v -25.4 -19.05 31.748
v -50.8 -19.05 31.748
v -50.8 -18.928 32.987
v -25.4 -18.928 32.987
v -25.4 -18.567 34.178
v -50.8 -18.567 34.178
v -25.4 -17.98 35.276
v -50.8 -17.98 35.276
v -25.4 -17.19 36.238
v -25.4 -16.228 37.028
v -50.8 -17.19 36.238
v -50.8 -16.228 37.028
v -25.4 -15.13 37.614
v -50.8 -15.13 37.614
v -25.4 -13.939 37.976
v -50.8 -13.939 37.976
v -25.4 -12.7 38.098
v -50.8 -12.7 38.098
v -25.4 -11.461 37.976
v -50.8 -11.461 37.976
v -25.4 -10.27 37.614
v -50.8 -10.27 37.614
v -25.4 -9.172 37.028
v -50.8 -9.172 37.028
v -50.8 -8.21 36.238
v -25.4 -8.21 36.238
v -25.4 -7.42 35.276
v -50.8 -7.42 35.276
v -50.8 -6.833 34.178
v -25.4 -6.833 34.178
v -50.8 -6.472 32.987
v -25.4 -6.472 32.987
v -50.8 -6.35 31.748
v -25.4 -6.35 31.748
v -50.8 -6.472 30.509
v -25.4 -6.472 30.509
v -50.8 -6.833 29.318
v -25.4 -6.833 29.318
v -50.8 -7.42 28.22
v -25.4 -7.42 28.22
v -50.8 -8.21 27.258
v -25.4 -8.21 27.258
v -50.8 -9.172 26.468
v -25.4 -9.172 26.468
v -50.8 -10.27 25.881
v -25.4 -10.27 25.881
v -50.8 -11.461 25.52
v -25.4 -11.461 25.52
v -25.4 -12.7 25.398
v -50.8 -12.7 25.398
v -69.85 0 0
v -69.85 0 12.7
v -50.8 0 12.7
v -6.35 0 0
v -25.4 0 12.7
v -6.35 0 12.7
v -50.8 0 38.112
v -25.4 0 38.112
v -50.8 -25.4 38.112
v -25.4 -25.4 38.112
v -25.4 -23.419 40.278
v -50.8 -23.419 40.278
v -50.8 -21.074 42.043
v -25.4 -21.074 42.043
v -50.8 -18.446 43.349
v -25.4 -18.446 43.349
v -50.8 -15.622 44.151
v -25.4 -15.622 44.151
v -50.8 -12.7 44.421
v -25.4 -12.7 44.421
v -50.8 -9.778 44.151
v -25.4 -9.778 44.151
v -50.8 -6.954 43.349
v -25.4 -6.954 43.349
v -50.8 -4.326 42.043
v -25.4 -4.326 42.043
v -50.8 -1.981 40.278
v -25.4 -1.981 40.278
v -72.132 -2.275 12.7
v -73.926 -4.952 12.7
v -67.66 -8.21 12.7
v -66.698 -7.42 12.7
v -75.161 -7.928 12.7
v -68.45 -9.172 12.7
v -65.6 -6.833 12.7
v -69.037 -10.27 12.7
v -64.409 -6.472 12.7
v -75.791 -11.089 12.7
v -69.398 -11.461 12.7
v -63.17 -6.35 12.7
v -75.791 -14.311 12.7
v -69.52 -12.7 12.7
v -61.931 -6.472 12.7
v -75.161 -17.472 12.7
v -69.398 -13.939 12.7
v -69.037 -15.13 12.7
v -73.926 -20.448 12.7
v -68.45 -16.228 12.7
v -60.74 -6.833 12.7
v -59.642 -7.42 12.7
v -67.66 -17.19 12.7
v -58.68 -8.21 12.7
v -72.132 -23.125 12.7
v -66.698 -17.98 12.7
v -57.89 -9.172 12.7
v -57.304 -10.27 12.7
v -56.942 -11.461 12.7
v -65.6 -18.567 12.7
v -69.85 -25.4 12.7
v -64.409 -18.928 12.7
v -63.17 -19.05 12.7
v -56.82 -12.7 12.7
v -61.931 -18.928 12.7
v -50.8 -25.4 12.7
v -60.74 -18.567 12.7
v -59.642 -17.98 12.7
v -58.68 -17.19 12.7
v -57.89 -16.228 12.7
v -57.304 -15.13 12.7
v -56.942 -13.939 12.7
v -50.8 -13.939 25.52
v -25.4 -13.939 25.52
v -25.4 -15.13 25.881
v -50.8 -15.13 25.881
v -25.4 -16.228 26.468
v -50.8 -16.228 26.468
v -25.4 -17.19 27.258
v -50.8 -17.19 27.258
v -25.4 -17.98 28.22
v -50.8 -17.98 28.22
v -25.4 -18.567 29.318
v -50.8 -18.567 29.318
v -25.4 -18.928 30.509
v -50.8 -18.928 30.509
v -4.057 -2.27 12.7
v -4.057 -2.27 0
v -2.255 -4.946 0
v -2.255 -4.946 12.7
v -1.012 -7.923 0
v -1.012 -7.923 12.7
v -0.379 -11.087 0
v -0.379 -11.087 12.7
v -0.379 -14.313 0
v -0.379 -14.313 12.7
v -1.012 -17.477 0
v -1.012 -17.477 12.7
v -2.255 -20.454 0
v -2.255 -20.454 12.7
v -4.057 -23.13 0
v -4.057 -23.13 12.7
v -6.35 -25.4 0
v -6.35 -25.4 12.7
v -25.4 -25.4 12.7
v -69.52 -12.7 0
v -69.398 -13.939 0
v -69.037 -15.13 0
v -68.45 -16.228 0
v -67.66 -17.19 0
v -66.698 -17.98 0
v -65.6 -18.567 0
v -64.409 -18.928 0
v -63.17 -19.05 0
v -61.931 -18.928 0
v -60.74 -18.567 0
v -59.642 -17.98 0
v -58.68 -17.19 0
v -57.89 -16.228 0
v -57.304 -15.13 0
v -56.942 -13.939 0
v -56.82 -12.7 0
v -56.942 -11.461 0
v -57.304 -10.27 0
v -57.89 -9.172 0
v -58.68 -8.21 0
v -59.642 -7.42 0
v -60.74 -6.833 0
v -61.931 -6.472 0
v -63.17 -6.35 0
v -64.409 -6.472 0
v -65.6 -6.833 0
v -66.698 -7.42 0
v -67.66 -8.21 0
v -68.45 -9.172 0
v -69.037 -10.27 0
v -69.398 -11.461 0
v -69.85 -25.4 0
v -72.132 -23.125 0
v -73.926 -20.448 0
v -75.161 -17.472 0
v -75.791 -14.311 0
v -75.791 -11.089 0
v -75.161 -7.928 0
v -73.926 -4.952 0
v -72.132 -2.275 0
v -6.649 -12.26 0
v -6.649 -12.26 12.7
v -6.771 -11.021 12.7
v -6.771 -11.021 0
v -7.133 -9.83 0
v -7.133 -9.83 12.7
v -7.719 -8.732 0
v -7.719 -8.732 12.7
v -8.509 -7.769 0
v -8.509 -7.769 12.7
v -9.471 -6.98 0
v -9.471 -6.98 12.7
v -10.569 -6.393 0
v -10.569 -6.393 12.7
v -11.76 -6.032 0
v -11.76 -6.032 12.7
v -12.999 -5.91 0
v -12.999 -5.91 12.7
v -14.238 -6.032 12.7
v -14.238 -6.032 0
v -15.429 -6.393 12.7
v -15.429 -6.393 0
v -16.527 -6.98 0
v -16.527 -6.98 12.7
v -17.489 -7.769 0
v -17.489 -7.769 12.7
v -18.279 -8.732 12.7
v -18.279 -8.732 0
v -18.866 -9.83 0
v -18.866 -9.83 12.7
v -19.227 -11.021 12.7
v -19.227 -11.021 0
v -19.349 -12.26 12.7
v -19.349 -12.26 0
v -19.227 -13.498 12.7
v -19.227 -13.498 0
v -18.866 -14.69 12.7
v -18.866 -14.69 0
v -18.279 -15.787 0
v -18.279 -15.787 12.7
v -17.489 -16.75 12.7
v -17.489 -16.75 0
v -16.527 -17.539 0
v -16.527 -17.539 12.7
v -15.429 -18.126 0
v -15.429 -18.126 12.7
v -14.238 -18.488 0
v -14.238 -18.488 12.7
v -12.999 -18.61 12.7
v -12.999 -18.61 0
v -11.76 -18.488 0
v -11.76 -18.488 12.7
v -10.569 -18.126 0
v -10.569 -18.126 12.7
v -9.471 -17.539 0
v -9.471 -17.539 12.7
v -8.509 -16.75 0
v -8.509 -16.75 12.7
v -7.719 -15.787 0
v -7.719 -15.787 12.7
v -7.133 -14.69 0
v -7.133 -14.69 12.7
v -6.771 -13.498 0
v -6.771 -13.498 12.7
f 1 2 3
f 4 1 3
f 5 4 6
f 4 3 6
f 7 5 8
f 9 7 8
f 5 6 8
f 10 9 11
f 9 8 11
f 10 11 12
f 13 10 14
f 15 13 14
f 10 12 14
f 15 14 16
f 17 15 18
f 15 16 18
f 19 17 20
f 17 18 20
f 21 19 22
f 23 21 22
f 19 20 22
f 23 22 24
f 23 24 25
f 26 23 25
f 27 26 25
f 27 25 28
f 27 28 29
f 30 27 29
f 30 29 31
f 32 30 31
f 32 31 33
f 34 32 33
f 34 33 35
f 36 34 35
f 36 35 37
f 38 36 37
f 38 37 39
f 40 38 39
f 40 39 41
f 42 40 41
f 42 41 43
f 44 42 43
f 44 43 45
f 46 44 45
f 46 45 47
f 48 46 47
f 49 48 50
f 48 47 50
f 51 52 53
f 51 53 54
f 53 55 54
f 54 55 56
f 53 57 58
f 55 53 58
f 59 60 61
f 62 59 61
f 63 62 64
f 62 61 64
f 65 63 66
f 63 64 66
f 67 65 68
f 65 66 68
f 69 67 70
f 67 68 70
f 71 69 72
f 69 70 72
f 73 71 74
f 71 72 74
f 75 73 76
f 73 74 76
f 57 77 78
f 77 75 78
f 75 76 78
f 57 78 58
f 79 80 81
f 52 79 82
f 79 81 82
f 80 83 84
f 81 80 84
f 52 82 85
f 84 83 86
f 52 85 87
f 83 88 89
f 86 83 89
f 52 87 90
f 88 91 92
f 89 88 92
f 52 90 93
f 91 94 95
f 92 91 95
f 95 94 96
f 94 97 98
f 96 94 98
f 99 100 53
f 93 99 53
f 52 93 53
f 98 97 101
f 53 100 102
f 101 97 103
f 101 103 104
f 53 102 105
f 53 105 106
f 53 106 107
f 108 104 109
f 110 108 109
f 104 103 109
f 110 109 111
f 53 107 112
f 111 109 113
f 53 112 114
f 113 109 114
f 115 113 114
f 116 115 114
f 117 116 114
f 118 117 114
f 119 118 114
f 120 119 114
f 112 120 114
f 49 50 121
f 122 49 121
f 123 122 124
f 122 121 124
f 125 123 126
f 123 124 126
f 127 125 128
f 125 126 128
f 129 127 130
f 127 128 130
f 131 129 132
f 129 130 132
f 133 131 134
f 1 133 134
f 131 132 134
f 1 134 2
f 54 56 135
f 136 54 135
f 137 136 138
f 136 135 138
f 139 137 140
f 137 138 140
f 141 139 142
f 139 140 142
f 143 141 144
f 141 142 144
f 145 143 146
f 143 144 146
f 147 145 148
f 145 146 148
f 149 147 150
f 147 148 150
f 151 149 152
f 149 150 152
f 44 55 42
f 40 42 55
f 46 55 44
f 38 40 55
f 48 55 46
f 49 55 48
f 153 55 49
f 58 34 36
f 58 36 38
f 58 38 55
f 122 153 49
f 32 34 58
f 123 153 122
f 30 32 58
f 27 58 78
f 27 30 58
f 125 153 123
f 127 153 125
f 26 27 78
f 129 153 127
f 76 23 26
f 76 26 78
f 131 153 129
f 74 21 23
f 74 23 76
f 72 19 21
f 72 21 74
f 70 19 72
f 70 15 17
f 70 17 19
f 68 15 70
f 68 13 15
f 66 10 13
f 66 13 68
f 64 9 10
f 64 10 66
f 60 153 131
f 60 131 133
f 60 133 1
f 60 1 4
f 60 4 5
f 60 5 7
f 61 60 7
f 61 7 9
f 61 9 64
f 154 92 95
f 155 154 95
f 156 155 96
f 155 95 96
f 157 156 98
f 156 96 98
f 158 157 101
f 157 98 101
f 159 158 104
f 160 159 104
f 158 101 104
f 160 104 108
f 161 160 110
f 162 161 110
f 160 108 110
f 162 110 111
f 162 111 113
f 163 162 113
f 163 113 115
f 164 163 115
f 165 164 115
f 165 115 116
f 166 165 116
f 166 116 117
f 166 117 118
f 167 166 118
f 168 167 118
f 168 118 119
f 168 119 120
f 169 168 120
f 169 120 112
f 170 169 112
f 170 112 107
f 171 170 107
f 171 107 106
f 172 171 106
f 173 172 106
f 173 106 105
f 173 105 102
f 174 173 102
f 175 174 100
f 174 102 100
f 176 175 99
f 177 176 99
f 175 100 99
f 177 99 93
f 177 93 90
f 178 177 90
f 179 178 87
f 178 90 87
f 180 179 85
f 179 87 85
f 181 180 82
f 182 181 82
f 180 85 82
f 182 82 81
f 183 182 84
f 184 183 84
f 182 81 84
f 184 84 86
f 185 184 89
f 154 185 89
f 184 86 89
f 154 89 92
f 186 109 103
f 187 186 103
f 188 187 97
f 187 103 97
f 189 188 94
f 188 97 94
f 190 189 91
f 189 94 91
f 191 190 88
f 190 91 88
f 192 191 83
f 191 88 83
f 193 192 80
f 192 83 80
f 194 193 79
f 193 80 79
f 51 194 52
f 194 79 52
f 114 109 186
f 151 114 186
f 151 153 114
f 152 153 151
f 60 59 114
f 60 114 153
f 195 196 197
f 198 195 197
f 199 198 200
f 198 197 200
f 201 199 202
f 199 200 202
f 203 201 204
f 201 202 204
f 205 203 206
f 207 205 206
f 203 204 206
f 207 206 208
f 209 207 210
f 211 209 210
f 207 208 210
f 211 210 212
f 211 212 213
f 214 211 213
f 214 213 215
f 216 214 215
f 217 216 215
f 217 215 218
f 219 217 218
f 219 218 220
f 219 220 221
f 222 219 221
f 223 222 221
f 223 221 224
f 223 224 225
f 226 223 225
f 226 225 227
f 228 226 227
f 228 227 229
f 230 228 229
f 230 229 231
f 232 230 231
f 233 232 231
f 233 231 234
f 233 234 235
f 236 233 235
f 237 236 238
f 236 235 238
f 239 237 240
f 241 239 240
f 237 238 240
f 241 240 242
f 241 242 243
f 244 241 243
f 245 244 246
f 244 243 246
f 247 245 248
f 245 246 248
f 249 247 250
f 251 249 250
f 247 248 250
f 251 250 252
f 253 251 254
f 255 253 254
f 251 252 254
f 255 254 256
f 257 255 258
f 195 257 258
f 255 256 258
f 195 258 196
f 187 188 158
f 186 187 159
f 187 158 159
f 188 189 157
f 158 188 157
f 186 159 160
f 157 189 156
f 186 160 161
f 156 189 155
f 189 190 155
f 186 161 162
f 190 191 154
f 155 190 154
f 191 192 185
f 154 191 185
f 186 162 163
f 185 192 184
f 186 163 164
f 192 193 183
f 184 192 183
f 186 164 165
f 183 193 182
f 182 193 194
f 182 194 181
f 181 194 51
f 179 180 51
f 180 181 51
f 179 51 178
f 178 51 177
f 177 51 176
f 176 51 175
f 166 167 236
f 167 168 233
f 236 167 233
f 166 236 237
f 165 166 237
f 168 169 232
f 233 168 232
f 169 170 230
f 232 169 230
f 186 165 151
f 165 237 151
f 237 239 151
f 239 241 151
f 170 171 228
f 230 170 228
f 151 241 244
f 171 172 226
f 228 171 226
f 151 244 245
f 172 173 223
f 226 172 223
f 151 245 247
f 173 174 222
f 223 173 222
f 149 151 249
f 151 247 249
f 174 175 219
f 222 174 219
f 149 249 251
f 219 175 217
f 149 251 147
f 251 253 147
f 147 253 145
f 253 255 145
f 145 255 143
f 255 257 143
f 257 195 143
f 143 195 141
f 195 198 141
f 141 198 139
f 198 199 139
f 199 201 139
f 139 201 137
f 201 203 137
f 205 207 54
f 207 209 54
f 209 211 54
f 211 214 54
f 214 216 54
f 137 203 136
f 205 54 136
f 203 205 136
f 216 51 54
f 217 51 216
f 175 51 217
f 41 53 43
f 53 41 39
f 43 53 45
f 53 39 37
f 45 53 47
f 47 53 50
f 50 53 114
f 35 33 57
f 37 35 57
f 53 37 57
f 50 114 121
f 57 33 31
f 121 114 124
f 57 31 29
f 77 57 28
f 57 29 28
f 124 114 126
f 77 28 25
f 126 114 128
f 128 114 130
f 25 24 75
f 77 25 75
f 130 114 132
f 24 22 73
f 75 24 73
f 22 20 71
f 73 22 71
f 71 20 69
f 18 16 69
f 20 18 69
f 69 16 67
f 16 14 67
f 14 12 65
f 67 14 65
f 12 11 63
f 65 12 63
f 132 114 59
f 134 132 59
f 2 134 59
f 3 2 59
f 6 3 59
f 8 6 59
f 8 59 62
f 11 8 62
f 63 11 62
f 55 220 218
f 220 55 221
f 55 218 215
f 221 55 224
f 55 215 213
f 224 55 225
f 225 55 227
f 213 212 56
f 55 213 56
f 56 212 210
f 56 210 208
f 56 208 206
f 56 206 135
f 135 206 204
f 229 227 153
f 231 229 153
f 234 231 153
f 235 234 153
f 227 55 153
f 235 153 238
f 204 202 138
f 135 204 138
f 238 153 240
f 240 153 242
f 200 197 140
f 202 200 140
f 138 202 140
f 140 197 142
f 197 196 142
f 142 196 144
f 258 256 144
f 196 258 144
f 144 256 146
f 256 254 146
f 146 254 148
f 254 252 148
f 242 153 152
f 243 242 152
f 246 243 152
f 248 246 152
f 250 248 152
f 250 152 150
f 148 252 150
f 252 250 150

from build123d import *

# Parameters (mm, degrees)
F0_W      = 76.2
F0_H      = 44.45
F1_DEPTH  = 25.4
F2_W      = 25.4
F2_H      = 31.75
F3_DEPTH  = 25.401
F5_DEPTH  = 50.801
F7_DEPTH  = 12.701
F9_DEPTH  = 12.701
F11_DEPTH = 50.501718
F13_DEPTH = 12.701
F14_R     = 6.35
F15_DEPTH = 12.701


with BuildPart() as f1:
    # F0 (on Front) → F1 (new body)
    with BuildSketch(Plane.XZ):
        with Locations((-38.1, 22.225)):
            Rectangle(F0_W, F0_H)
    extrude(amount=F1_DEPTH)

    # F2 (on face) → F3 (cut, through all)
    with BuildSketch(Plane.XZ.offset(25.4)):
        with Locations((-63.5, 28.575)):
            Rectangle(F2_W, F2_H)
        with Locations((-12.7, 28.575)):
            Rectangle(F2_W, F2_H)
    extrude(amount=-F3_DEPTH, mode=Mode.SUBTRACT)

    # F4 (on face) → F5 (cut, through all)
    with BuildSketch(Plane.YZ.offset(-25.4)):
        with BuildLine():
            Line((-25.4, 44.45), (-25.4, 38.112387))
            ThreePointArc((-25.4, 38.112387), (-12.7, 44.420951), (0, 38.112387))
            Line((0, 38.112387), (0, 44.45))
            Line((0, 44.45), (-25.4, 44.45))
        make_face()
    extrude(amount=-F5_DEPTH, mode=Mode.SUBTRACT)

    # F6 (on face) → F7 (cut, through all)
    with BuildSketch(Plane.XY.offset(12.7)):
        with BuildLine():
            Line((0, 0), (-6.35, 0))
            ThreePointArc((-6.35, 0), (-0.299282, -12.7), (-6.35, -25.4))
            Line((-6.35, -25.4), (0, -25.4))
            Line((0, -25.4), (0, 0))
        make_face()
    extrude(amount=-F7_DEPTH, mode=Mode.SUBTRACT)

    # F8 (on face) → F9 (cut, through all)
    with BuildSketch(Plane.XY.offset(12.7)):
        with BuildLine():
            Line((-76.2, -25.4), (-69.85, -25.4))
            ThreePointArc((-69.85, -25.4), (-75.870322, -12.7), (-69.85, 0))
            Line((-69.85, 0), (-76.2, 0))
            Line((-76.2, 0), (-76.2, -25.4))
        make_face()
    extrude(amount=-F9_DEPTH, mode=Mode.SUBTRACT)

    # F10 (on face) → F11 (cut, through all)
    with BuildSketch(Plane(origin=(-50.8, 0, 0), x_dir=(0, -1, 0), z_dir=(-1, 0, 0))):
        with BuildLine():
            ThreePointArc((19.05, 31.747822), (8.209872, 36.23795), (12.7, 25.397822))
            ThreePointArc((12.7, 25.397822), (17.190128, 27.257694), (19.05, 31.747822))
        make_face()
    extrude(amount=-F11_DEPTH, mode=Mode.SUBTRACT)

    # F12 (on face) → F13 (cut, through all)
    with BuildSketch(Plane.XY.offset(12.7)):
        with BuildLine():
            ThreePointArc((-56.820322, -12.7), (-63.170322, -6.35), (-69.520322, -12.7))
            ThreePointArc((-69.520322, -12.7), (-63.170322, -19.05), (-56.820322, -12.7))
        make_face()
    extrude(amount=-F13_DEPTH, mode=Mode.SUBTRACT)

    # F14 (on face) → F15 (cut, through all)
    with BuildSketch(Plane.XY.offset(12.7)):
        with Locations((-12.999282, -12.259598)):
            Circle(F14_R)
    extrude(amount=-F15_DEPTH, mode=Mode.SUBTRACT)


solid = f1.part
